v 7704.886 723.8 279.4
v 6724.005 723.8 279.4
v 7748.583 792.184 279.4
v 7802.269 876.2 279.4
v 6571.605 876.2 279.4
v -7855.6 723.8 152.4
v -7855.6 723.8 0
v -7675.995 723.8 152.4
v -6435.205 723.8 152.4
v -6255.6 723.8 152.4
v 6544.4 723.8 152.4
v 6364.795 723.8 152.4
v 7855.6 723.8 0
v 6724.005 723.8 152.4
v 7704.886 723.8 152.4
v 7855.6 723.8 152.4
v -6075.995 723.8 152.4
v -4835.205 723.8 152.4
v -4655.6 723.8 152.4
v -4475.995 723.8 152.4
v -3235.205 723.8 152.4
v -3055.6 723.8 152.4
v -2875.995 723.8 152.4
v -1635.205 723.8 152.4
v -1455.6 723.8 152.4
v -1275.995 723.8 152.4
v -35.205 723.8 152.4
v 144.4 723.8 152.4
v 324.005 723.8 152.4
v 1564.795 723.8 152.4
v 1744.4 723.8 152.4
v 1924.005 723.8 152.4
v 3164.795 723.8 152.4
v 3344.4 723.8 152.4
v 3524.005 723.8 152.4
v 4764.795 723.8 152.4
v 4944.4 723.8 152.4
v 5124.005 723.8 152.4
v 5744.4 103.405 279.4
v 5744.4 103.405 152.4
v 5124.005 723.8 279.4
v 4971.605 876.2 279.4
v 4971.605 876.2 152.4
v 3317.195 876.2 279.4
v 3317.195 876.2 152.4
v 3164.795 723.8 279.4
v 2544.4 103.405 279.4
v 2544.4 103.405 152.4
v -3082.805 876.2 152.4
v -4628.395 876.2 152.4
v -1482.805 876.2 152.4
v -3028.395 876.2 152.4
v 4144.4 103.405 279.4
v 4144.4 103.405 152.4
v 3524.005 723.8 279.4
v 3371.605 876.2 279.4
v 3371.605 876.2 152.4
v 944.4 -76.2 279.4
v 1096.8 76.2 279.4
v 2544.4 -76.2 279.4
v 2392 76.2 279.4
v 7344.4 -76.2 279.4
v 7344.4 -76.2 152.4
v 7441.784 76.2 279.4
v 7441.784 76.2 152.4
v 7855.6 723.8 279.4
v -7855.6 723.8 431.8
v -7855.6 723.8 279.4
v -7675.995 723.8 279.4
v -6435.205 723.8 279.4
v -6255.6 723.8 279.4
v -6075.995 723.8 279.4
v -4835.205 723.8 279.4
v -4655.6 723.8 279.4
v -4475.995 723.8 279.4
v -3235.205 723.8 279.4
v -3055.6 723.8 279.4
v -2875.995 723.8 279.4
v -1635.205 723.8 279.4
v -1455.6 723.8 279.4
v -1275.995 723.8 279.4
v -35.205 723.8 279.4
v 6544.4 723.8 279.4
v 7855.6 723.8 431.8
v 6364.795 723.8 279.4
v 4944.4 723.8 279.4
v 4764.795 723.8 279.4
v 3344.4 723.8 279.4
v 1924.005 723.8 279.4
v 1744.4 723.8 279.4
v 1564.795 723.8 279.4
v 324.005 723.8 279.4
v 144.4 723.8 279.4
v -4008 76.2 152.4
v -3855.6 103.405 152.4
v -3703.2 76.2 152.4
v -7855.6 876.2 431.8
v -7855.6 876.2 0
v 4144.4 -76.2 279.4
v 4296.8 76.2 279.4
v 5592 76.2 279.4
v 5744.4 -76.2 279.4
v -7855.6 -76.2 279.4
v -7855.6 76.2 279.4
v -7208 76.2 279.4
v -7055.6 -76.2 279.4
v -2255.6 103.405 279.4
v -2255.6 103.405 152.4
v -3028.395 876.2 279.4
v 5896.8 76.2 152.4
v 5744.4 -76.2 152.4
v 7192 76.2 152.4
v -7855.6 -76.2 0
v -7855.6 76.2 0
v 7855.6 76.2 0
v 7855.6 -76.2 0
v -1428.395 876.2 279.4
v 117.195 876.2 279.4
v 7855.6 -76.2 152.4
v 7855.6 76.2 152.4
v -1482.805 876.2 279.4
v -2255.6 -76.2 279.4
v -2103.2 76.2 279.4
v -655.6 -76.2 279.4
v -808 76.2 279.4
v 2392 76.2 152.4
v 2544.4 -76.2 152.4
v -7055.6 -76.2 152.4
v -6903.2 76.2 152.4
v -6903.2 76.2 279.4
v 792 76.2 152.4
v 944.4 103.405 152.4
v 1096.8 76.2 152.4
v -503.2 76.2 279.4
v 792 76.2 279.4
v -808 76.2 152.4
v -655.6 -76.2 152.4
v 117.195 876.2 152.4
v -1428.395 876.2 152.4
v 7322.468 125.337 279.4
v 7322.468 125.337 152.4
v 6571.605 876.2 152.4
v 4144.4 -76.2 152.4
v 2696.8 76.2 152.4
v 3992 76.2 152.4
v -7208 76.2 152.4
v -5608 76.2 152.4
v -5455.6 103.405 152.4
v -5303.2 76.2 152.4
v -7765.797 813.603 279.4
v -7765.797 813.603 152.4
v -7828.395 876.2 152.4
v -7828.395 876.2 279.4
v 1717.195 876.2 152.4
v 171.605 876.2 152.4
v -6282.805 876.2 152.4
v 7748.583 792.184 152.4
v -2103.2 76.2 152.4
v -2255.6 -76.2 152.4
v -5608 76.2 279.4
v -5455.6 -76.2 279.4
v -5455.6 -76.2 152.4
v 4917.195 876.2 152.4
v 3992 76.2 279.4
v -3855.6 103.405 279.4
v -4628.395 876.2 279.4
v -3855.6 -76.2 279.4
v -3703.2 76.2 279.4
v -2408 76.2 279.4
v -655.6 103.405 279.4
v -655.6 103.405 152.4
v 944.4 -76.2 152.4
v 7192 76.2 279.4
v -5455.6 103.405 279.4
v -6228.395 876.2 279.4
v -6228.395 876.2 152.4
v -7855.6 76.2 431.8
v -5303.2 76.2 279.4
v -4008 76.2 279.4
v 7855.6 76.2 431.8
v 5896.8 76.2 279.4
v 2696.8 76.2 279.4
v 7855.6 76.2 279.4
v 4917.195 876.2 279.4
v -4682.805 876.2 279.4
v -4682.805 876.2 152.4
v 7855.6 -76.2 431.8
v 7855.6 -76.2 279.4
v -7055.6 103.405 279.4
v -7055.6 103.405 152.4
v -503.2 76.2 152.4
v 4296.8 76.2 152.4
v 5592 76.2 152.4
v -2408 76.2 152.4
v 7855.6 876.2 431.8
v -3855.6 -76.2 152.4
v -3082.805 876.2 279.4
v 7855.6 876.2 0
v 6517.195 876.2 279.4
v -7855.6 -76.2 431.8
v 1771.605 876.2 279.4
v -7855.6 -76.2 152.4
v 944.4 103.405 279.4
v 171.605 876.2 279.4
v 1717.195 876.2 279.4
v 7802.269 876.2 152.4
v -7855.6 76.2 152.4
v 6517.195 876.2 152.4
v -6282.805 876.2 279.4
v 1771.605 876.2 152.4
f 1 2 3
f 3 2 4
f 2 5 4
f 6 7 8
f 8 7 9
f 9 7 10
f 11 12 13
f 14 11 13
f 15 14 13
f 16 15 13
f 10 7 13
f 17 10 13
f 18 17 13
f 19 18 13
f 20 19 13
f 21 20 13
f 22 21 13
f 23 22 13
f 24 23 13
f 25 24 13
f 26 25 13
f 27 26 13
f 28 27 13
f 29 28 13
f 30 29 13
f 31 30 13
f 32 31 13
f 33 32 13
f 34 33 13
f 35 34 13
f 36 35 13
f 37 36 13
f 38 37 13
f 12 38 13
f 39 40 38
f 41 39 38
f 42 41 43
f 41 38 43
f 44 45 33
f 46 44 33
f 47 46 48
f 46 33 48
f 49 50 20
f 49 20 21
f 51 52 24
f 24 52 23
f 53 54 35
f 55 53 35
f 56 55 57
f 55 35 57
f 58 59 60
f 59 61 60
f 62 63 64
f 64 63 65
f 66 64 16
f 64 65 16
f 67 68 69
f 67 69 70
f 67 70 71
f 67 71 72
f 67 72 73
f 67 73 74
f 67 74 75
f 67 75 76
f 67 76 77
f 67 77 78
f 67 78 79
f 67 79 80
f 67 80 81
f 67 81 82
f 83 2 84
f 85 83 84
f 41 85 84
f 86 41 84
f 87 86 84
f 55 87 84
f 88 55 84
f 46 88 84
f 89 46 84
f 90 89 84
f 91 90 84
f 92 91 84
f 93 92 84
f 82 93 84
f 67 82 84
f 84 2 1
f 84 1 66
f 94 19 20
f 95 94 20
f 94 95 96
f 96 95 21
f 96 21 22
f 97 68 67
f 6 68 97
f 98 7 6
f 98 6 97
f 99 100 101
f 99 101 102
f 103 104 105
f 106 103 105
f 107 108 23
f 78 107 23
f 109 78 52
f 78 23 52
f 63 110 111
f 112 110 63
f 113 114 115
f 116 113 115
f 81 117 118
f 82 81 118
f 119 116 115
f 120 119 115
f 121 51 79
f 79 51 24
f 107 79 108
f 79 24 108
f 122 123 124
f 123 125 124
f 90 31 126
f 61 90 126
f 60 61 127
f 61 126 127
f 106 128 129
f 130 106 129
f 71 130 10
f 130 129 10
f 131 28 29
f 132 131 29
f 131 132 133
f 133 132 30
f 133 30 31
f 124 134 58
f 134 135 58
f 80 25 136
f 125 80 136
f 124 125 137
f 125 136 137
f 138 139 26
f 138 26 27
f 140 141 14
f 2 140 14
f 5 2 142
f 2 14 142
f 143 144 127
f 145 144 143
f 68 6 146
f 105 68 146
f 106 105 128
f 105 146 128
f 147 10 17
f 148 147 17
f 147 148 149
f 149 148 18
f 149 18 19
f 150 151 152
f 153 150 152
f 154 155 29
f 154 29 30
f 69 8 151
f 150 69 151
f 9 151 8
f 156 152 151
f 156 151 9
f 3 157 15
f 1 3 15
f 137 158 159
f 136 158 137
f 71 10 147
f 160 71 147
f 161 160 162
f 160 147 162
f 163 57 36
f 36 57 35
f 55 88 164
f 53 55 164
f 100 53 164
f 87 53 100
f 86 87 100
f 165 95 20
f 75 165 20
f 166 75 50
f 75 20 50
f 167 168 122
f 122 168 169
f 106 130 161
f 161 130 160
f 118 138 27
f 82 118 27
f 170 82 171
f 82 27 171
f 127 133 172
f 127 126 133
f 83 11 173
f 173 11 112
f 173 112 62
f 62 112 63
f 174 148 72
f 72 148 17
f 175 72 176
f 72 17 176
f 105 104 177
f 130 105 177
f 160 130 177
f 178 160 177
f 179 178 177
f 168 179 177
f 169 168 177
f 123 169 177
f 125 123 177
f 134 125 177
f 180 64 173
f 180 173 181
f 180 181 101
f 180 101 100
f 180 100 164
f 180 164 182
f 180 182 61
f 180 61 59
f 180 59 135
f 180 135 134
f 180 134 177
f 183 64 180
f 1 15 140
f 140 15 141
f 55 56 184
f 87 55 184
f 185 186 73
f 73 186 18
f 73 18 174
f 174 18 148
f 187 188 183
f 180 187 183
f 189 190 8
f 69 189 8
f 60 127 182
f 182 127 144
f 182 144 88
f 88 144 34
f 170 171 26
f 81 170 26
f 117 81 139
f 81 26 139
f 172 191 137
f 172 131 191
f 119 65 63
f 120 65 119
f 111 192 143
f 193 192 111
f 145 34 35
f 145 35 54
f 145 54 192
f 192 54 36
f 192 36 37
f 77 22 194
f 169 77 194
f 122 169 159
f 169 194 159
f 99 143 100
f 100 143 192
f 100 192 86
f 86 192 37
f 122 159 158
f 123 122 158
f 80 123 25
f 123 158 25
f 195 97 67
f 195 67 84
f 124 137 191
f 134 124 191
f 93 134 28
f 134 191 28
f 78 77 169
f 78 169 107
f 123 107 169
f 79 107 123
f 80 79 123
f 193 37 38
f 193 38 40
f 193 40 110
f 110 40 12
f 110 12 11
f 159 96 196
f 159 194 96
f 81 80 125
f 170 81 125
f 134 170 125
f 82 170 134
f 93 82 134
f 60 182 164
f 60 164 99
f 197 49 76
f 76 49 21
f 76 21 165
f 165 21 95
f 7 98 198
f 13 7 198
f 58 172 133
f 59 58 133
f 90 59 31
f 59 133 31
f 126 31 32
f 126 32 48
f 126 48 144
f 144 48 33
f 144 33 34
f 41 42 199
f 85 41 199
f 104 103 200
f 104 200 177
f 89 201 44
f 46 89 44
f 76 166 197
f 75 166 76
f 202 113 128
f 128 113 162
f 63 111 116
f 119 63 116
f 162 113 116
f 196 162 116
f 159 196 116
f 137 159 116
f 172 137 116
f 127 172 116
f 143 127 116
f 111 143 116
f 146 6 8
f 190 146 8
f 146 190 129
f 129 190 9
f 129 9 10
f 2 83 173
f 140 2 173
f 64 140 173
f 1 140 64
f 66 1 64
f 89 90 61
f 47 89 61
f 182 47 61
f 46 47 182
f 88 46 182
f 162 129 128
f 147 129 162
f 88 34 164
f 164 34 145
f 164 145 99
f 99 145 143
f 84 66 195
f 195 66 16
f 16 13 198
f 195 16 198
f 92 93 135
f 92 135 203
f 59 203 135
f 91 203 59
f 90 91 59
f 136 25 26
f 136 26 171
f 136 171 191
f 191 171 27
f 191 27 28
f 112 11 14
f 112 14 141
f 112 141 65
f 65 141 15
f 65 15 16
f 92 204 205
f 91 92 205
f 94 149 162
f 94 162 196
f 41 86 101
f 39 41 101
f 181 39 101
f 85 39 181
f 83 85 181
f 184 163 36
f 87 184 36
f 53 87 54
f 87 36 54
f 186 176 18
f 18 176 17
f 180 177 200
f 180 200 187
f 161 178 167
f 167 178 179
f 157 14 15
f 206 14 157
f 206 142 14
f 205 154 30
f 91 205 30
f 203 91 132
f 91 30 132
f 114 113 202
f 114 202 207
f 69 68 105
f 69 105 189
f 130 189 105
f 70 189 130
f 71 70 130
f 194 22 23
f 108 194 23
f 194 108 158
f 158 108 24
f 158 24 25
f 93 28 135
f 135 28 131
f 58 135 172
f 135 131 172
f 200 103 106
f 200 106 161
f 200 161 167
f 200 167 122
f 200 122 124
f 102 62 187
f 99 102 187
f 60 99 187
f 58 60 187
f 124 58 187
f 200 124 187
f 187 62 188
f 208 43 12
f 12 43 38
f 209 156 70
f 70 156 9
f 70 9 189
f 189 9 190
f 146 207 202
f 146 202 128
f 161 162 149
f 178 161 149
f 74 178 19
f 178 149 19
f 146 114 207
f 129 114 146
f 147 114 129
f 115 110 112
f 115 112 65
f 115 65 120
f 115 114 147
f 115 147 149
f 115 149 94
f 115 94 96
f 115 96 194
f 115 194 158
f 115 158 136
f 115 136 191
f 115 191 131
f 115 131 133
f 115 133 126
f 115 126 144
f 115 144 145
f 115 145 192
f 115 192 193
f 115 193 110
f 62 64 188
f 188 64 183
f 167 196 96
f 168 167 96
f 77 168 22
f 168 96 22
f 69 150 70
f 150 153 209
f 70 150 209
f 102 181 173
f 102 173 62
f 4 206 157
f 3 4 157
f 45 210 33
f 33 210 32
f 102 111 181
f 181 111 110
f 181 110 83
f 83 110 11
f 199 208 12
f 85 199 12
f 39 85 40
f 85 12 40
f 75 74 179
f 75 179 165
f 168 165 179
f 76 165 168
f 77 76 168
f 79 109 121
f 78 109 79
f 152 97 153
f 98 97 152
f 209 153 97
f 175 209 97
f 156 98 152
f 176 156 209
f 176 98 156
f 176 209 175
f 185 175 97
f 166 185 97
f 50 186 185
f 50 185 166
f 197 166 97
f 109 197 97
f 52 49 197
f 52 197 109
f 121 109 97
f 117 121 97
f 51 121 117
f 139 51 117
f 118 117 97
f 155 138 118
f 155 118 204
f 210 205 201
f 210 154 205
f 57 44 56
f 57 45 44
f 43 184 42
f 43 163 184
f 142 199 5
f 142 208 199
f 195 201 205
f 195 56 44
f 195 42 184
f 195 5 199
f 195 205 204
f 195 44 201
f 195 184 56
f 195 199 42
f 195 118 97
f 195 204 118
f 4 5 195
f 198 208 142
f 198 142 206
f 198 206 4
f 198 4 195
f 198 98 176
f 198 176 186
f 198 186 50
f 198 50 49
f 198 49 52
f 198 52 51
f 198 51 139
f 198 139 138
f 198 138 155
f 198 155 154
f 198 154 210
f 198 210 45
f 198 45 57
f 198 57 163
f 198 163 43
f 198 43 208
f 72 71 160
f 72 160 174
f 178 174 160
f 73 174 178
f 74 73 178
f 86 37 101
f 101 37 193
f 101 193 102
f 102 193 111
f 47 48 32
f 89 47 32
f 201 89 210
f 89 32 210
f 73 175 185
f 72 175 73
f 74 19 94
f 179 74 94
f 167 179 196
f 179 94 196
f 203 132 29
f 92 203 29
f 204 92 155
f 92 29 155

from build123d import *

# Parameters (mm, degrees)
CROQUIS1_W                = 15711.2
CROQUIS1_H                = 152.4
SALIENTE_EXTRUIR1_DEPTH   = 152.4
SALIENTE_EXTRUIR1_2_DEPTH = 152.4
SALIENTE_EXTRUIR4_DEPTH   = 127
CROQUIS6_W                = 15711.2
CROQUIS6_H                = 152.4
SALIENTE_EXTRUIR5_DEPTH   = 152.4


with BuildPart() as part:
    # Croquis1 → Saliente-Extruir1 (new body)
    with BuildSketch(Plane.XY):
        Rectangle(CROQUIS1_W, CROQUIS1_H)
    extrude(amount=SALIENTE_EXTRUIR1_DEPTH)



with BuildPart() as body_2:
    # Croquis1 → Saliente-Extruir1 2 (new body)
    with BuildSketch(Plane.XY):
        with Locations((0, 800)):
            Rectangle(CROQUIS1_W, CROQUIS1_H)
    extrude(amount=SALIENTE_EXTRUIR1_2_DEPTH)


with BuildPart() as part_1:
    add(part.part)

    add(body_2.part)  # Saliente-Extruir4 merges body 2
    # Croquis5 → Saliente-Extruir4 (add)
    with BuildSketch(Plane.XY.offset(152.4)):
        Polygon((7704.88566953, 723.8), (7855.6, 723.8), (7855.6, 876.2), (7802.26926953, 876.2), (7748.582970168, 792.183882063), align=None)
        Polygon((6724.005122421, 723.8), (6544.4, 723.8), (7344.4, -76.2), (7855.6, 723.8), (7704.88566953, 723.8), (7322.467933348, 125.337189073), align=None)
        Polygon((6364.794877579, 723.8), (6544.4, 723.8), (6724.005122421, 723.8), (6571.605122421, 876.2), (6517.194877579, 876.2), align=None)
        Polygon((5124.005122421, 723.8), (4944.4, 723.8), (5744.4, -76.2), (6544.4, 723.8), (6364.794877579, 723.8), (5744.4, 103.405122421), align=None)
        Polygon((4764.794877579, 723.8), (4944.4, 723.8), (5124.005122421, 723.8), (4971.605122421, 876.2), (4917.194877579, 876.2), align=None)
        Polygon((3524.005122421, 723.8), (3344.4, 723.8), (4144.4, -76.2), (4944.4, 723.8), (4764.794877579, 723.8), (4144.4, 103.405122421), align=None)
        Polygon((3164.794877579, 723.8), (3344.4, 723.8), (3524.005122421, 723.8), (3371.605122421, 876.2), (3317.194877579, 876.2), align=None)
        Polygon((1924.005122421, 723.8), (1744.4, 723.8), (2544.4, -76.2), (3344.4, 723.8), (3164.794877579, 723.8), (2544.4, 103.405122421), align=None)
        Polygon((1564.794877579, 723.8), (1744.4, 723.8), (1924.005122421, 723.8), (1771.605122421, 876.2), (1717.194877579, 876.2), align=None)
        Polygon((324.005122421, 723.8), (144.4, 723.8), (944.4, -76.2), (1744.4, 723.8), (1564.794877579, 723.8), (944.4, 103.405122421), align=None)
        Polygon((-35.205122421, 723.8), (144.4, 723.8), (324.005122421, 723.8), (171.605122421, 876.2), (117.194877579, 876.2), align=None)
        Polygon((-1275.994877579, 723.8), (-1455.6, 723.8), (-655.6, -76.2), (144.4, 723.8), (-35.205122421, 723.8), (-655.6, 103.405122421), align=None)
        Polygon((-1635.205122421, 723.8), (-1455.6, 723.8), (-1275.994877579, 723.8), (-1428.394877579, 876.2), (-1482.805122421, 876.2), align=None)
        Polygon((-2875.994877579, 723.8), (-3055.6, 723.8), (-2255.6, -76.2), (-1455.6, 723.8), (-1635.205122421, 723.8), (-2255.6, 103.405122421), align=None)
        Polygon((-3235.205122421, 723.8), (-3055.6, 723.8), (-2875.994877579, 723.8), (-3028.394877579, 876.2), (-3082.805122421, 876.2), align=None)
        Polygon((-4475.994877579, 723.8), (-4655.6, 723.8), (-3855.6, -76.2), (-3055.6, 723.8), (-3235.205122421, 723.8), (-3855.6, 103.405122421), align=None)
        Polygon((-4835.205122421, 723.8), (-4655.6, 723.8), (-4475.994877579, 723.8), (-4628.394877579, 876.2), (-4682.805122421, 876.2), align=None)
        Polygon((-6075.994877579, 723.8), (-6255.6, 723.8), (-5455.6, -76.2), (-4655.6, 723.8), (-4835.205122421, 723.8), (-5455.6, 103.405122421), align=None)
        Polygon((-6435.205122421, 723.8), (-6255.6, 723.8), (-6075.994877579, 723.8), (-6228.394877579, 876.2), (-6282.805122421, 876.2), align=None)
        Polygon((-7675.994877579, 723.8), (-7855.6, 723.8), (-7055.6, -76.2), (-6255.6, 723.8), (-6435.205122421, 723.8), (-7055.6, 103.405122421), align=None)
        Polygon((-7855.6, 876.2), (-7855.6, 723.8), (-7675.994877579, 723.8), (-7765.797438789, 813.602561211), (-7828.394877579, 876.2), align=None)
    extrude(amount=SALIENTE_EXTRUIR4_DEPTH)

    # Croquis6 → Saliente-Extruir5 (add)
    with BuildSketch(Plane.XY.offset(279.4)):
        with Locations((0, 800)):
            Rectangle(CROQUIS6_W, CROQUIS6_H)
        Rectangle(CROQUIS6_W, CROQUIS6_H)
    extrude(amount=SALIENTE_EXTRUIR5_DEPTH)


solid = part_1.part
